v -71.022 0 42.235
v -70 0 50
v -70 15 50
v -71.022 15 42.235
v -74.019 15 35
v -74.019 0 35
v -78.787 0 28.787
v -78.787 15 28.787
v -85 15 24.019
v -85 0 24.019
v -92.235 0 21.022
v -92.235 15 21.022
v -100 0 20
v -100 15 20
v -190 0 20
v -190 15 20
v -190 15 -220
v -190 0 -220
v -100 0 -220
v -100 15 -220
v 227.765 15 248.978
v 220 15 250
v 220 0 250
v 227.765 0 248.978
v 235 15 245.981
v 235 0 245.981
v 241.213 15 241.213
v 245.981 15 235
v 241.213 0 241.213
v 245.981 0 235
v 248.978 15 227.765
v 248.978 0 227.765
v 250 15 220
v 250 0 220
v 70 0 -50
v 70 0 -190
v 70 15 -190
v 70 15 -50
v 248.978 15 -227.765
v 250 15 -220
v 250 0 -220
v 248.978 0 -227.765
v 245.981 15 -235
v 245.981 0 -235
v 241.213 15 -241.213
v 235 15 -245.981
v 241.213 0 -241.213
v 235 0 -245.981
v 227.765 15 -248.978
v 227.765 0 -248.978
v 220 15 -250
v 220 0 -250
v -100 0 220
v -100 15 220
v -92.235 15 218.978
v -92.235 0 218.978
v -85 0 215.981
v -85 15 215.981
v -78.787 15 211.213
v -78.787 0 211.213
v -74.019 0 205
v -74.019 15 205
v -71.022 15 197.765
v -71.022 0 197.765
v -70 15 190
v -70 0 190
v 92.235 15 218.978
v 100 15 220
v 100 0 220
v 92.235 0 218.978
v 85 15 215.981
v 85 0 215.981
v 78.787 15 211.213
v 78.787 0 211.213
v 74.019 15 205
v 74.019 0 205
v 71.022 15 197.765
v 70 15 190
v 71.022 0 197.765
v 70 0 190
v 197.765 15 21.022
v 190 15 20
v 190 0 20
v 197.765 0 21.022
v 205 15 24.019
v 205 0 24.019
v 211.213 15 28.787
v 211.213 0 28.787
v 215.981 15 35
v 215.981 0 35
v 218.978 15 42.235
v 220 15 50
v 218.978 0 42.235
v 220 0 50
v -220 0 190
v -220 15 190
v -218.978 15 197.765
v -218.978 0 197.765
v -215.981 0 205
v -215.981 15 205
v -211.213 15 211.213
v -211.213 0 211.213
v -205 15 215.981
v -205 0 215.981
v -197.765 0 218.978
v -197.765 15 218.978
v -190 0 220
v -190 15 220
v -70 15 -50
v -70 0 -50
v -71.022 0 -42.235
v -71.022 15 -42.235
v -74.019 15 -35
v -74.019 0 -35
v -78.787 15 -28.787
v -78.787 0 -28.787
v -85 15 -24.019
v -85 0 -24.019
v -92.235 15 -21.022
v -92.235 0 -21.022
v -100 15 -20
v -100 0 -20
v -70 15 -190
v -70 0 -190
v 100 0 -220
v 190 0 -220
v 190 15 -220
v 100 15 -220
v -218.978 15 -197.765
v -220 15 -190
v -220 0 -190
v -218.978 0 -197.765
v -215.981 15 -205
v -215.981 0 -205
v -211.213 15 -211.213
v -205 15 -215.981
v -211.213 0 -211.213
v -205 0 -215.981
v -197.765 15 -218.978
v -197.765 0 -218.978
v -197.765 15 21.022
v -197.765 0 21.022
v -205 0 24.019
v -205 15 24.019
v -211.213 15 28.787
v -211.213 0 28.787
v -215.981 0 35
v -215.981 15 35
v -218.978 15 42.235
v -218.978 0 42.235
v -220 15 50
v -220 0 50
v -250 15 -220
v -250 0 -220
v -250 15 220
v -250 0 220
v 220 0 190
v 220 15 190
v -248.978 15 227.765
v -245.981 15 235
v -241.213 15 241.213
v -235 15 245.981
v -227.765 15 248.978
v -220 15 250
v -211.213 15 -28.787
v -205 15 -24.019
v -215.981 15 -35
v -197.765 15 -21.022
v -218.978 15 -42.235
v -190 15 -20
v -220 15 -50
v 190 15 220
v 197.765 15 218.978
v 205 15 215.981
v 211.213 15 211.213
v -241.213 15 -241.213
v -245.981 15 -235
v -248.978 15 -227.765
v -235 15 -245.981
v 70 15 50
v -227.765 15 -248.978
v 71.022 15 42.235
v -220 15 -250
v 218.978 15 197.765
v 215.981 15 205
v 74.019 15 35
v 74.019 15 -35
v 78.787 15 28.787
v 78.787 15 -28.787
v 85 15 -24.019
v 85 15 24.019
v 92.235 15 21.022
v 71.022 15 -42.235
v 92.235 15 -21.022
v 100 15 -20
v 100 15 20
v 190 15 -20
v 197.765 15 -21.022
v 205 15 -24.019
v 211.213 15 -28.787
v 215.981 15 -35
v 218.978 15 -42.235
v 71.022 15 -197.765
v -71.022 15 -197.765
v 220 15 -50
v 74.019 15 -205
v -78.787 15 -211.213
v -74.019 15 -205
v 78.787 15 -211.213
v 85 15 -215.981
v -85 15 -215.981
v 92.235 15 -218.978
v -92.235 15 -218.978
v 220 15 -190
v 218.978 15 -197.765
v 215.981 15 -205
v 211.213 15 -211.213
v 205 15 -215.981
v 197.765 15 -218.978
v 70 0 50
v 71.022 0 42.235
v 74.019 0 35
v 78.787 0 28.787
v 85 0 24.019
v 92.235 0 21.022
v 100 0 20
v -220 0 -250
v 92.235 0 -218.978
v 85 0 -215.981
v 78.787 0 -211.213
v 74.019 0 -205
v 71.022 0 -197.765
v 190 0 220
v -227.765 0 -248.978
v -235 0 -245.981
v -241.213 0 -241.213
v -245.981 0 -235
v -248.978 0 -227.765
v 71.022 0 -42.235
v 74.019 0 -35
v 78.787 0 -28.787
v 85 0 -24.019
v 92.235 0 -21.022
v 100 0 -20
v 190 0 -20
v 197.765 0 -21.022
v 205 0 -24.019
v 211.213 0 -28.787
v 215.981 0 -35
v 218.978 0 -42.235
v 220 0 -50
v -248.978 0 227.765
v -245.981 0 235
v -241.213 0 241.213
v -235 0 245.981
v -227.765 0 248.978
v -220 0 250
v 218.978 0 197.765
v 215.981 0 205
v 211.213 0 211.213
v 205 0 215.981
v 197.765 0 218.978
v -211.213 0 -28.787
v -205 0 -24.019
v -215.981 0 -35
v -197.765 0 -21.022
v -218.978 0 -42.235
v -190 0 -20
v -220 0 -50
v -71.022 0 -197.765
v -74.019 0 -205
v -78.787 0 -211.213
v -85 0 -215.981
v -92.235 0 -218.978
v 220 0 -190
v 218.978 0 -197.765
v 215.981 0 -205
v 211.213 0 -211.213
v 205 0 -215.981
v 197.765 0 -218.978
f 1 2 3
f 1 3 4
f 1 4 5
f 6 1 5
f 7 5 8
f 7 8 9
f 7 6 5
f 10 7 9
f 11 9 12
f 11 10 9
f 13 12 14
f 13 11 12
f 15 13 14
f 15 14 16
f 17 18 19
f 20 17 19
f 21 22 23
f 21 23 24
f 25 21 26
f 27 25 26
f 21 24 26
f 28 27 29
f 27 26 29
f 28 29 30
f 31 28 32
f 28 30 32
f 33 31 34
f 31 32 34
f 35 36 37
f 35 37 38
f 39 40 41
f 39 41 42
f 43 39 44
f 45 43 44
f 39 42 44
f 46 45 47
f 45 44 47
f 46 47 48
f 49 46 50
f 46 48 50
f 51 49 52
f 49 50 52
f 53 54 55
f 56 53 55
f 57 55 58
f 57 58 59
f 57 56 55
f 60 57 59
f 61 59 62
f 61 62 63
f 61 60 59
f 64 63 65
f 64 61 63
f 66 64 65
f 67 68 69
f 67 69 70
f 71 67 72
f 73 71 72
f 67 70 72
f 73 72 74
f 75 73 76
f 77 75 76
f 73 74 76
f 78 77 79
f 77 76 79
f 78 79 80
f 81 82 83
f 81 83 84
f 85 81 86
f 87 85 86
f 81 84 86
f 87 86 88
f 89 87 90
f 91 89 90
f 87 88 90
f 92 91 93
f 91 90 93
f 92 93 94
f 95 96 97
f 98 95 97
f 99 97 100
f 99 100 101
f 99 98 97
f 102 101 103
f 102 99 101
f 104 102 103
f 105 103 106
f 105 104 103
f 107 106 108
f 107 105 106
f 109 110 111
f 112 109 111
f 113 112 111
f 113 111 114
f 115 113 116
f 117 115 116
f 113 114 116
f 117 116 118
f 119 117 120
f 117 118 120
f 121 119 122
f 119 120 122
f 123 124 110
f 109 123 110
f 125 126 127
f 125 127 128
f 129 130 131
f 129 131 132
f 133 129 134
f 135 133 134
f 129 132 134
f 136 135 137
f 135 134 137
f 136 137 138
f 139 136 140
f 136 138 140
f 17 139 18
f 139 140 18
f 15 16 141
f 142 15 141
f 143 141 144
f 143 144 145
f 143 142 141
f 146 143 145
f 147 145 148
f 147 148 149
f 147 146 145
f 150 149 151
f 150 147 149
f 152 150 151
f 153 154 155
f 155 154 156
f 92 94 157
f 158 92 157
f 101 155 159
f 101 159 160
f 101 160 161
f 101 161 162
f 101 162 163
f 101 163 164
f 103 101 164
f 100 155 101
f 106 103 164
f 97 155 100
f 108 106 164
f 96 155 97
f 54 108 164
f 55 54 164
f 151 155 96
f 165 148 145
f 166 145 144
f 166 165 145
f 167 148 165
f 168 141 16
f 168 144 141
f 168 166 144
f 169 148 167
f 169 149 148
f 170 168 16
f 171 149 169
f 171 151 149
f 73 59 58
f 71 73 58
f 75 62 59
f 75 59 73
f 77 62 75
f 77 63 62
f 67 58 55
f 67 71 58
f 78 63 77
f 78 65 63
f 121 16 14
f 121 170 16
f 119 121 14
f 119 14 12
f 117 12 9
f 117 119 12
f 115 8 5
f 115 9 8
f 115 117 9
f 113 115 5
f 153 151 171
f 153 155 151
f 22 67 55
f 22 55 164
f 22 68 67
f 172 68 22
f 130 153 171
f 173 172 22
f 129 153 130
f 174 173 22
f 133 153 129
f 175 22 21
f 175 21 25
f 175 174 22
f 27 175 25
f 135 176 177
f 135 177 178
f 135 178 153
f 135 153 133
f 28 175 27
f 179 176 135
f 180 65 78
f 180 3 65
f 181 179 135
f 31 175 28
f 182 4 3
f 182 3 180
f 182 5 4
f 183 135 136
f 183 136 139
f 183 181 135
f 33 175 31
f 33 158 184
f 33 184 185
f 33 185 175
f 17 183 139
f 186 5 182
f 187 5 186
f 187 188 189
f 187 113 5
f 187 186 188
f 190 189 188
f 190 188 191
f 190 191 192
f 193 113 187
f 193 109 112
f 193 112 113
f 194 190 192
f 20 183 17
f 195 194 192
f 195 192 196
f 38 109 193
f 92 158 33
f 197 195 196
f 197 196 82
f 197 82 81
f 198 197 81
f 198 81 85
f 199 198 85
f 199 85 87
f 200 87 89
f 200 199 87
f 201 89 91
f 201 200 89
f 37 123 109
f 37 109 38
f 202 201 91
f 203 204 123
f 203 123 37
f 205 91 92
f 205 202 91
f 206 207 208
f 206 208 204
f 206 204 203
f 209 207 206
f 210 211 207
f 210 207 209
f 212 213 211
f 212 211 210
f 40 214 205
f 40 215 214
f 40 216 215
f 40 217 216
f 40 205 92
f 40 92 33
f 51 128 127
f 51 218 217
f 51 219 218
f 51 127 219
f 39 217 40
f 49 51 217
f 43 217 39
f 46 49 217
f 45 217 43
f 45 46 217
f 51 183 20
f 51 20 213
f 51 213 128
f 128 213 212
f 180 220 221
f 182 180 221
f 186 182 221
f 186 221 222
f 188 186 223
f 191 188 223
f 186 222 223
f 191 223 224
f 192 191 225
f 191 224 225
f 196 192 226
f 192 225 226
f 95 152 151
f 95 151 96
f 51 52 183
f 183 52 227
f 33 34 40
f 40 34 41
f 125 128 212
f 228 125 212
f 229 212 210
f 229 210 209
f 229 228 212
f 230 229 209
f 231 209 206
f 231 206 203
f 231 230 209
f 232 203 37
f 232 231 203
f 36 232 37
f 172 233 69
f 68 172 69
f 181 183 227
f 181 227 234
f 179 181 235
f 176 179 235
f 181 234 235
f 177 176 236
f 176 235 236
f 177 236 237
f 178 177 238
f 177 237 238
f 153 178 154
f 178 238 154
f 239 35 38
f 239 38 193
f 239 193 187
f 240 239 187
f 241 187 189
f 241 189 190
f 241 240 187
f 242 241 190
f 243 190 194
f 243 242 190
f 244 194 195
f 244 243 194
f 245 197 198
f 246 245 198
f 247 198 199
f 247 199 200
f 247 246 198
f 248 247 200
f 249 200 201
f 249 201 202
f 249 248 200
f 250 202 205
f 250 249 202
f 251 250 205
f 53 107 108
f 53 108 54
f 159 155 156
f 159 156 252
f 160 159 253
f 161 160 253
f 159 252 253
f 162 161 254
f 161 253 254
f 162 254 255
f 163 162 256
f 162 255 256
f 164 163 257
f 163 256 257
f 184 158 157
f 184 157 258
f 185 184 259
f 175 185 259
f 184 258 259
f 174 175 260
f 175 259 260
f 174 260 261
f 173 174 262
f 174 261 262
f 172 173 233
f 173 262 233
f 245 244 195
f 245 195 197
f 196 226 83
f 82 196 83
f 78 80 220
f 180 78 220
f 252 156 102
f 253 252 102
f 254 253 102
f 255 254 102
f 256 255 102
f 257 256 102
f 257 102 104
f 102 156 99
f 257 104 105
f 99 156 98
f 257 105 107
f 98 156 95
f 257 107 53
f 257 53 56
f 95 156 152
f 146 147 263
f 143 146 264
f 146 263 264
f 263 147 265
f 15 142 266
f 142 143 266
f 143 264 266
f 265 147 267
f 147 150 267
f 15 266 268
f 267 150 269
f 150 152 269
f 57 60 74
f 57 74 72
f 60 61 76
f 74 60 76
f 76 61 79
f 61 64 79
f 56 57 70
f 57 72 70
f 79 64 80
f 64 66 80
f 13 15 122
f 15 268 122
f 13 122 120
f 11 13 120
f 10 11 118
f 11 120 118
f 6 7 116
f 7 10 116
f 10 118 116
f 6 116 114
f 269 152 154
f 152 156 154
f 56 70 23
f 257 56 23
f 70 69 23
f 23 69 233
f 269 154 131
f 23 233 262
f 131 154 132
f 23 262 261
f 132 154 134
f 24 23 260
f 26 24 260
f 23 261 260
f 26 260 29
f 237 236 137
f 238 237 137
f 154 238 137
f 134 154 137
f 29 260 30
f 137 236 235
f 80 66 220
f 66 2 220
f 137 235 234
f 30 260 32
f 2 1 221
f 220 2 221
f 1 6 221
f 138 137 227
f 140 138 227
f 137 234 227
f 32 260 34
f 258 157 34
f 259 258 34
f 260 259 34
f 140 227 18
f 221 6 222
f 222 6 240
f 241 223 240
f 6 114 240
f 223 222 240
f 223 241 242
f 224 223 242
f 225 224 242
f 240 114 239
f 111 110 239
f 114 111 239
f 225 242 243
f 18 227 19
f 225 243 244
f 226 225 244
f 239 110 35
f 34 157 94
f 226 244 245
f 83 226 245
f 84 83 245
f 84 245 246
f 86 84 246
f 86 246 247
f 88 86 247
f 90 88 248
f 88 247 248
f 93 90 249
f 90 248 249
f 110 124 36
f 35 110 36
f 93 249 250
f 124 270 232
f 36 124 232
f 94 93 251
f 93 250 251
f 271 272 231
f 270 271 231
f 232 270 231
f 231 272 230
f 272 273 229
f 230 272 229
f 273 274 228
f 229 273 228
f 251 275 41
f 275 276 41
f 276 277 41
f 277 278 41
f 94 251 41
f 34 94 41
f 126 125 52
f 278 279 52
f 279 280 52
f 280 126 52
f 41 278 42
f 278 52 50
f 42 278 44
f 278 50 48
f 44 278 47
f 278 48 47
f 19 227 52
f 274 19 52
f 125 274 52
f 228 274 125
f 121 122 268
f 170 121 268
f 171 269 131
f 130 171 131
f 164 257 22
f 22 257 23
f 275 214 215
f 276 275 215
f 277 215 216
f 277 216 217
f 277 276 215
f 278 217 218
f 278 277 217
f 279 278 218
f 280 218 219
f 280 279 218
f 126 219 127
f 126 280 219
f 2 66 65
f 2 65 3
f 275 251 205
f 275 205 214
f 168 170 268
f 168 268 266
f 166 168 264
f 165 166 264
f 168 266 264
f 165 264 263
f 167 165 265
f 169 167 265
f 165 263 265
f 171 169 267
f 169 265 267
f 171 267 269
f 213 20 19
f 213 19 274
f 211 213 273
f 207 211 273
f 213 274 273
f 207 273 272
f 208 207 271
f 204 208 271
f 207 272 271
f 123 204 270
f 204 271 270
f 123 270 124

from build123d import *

# Parameters (mm, degrees)
EXTRUDE_1_DEPTH = 15


with BuildPart() as part:
    # 草图1 → 凸台-拉伸1 (new body)
    with BuildSketch(Plane(origin=(0, 0, 0), x_dir=(1, 0, 0), z_dir=(0, 1, 0))):
        with BuildLine():
            Line((220, 250), (-220, 250))
            ThreePointArc((-220, 250), (-241.213203436, 241.213203436), (-250, 220))
            Line((-250, 220), (-250, -220))
            ThreePointArc((-250, -220), (-241.213203436, -241.213203436), (-220, -250))
            Line((-220, -250), (220, -250))
            ThreePointArc((220, -250), (241.213203436, -241.213203436), (250, -220))
            Line((250, -220), (250, 220))
            ThreePointArc((250, 220), (241.213203436, 241.213203436), (220, 250))
        make_face()
        with BuildLine():
            Line((-100, 20), (-190, 20))
            ThreePointArc((-190, 20), (-211.213203436, 28.786796564), (-220, 50))
            Line((-220, 50), (-220, 190))
            ThreePointArc((-220, 190), (-211.213203436, 211.213203436), (-190, 220))
            Line((-190, 220), (-100, 220))
            ThreePointArc((-100, 220), (-78.786796564, 211.213203436), (-70, 190))
            Line((-70, 190), (-70, 50))
            ThreePointArc((-70, 50), (-78.786796564, 28.786796564), (-100, 20))
        make_face(mode=Mode.SUBTRACT)
        with BuildLine():
            Line((220, 50), (220, 190))
            ThreePointArc((220, 190), (211.213203436, 211.213203436), (190, 220))
            Line((190, 220), (100, 220))
            ThreePointArc((100, 220), (78.786796564, 211.213203436), (70, 190))
            Line((70, 190), (70, 50))
            ThreePointArc((70, 50), (78.786796564, 28.786796564), (100, 20))
            Line((100, 20), (190, 20))
            ThreePointArc((190, 20), (211.213203436, 28.786796564), (220, 50))
        make_face(mode=Mode.SUBTRACT)
        with BuildLine():
            Line((-220, -50), (-220, -190))
            ThreePointArc((-220, -190), (-211.213203436, -211.213203436), (-190, -220))
            Line((-190, -220), (-100, -220))
            ThreePointArc((-100, -220), (-78.786796564, -211.213203436), (-70, -190))
            Line((-70, -190), (-70, -50))
            ThreePointArc((-70, -50), (-78.786796564, -28.786796564), (-100, -20))
            Line((-100, -20), (-190, -20))
            ThreePointArc((-190, -20), (-211.213203436, -28.786796564), (-220, -50))
        make_face(mode=Mode.SUBTRACT)
        with BuildLine():
            Line((100, -20), (190, -20))
            ThreePointArc((190, -20), (211.213203436, -28.786796564), (220, -50))
            Line((220, -50), (220, -190))
            ThreePointArc((220, -190), (211.213203436, -211.213203436), (190, -220))
            Line((190, -220), (100, -220))
            ThreePointArc((100, -220), (78.786796564, -211.213203436), (70, -190))
            Line((70, -190), (70, -50))
            ThreePointArc((70, -50), (78.786796564, -28.786796564), (100, -20))
        make_face(mode=Mode.SUBTRACT)
    extrude(amount=EXTRUDE_1_DEPTH)


solid = part.part
